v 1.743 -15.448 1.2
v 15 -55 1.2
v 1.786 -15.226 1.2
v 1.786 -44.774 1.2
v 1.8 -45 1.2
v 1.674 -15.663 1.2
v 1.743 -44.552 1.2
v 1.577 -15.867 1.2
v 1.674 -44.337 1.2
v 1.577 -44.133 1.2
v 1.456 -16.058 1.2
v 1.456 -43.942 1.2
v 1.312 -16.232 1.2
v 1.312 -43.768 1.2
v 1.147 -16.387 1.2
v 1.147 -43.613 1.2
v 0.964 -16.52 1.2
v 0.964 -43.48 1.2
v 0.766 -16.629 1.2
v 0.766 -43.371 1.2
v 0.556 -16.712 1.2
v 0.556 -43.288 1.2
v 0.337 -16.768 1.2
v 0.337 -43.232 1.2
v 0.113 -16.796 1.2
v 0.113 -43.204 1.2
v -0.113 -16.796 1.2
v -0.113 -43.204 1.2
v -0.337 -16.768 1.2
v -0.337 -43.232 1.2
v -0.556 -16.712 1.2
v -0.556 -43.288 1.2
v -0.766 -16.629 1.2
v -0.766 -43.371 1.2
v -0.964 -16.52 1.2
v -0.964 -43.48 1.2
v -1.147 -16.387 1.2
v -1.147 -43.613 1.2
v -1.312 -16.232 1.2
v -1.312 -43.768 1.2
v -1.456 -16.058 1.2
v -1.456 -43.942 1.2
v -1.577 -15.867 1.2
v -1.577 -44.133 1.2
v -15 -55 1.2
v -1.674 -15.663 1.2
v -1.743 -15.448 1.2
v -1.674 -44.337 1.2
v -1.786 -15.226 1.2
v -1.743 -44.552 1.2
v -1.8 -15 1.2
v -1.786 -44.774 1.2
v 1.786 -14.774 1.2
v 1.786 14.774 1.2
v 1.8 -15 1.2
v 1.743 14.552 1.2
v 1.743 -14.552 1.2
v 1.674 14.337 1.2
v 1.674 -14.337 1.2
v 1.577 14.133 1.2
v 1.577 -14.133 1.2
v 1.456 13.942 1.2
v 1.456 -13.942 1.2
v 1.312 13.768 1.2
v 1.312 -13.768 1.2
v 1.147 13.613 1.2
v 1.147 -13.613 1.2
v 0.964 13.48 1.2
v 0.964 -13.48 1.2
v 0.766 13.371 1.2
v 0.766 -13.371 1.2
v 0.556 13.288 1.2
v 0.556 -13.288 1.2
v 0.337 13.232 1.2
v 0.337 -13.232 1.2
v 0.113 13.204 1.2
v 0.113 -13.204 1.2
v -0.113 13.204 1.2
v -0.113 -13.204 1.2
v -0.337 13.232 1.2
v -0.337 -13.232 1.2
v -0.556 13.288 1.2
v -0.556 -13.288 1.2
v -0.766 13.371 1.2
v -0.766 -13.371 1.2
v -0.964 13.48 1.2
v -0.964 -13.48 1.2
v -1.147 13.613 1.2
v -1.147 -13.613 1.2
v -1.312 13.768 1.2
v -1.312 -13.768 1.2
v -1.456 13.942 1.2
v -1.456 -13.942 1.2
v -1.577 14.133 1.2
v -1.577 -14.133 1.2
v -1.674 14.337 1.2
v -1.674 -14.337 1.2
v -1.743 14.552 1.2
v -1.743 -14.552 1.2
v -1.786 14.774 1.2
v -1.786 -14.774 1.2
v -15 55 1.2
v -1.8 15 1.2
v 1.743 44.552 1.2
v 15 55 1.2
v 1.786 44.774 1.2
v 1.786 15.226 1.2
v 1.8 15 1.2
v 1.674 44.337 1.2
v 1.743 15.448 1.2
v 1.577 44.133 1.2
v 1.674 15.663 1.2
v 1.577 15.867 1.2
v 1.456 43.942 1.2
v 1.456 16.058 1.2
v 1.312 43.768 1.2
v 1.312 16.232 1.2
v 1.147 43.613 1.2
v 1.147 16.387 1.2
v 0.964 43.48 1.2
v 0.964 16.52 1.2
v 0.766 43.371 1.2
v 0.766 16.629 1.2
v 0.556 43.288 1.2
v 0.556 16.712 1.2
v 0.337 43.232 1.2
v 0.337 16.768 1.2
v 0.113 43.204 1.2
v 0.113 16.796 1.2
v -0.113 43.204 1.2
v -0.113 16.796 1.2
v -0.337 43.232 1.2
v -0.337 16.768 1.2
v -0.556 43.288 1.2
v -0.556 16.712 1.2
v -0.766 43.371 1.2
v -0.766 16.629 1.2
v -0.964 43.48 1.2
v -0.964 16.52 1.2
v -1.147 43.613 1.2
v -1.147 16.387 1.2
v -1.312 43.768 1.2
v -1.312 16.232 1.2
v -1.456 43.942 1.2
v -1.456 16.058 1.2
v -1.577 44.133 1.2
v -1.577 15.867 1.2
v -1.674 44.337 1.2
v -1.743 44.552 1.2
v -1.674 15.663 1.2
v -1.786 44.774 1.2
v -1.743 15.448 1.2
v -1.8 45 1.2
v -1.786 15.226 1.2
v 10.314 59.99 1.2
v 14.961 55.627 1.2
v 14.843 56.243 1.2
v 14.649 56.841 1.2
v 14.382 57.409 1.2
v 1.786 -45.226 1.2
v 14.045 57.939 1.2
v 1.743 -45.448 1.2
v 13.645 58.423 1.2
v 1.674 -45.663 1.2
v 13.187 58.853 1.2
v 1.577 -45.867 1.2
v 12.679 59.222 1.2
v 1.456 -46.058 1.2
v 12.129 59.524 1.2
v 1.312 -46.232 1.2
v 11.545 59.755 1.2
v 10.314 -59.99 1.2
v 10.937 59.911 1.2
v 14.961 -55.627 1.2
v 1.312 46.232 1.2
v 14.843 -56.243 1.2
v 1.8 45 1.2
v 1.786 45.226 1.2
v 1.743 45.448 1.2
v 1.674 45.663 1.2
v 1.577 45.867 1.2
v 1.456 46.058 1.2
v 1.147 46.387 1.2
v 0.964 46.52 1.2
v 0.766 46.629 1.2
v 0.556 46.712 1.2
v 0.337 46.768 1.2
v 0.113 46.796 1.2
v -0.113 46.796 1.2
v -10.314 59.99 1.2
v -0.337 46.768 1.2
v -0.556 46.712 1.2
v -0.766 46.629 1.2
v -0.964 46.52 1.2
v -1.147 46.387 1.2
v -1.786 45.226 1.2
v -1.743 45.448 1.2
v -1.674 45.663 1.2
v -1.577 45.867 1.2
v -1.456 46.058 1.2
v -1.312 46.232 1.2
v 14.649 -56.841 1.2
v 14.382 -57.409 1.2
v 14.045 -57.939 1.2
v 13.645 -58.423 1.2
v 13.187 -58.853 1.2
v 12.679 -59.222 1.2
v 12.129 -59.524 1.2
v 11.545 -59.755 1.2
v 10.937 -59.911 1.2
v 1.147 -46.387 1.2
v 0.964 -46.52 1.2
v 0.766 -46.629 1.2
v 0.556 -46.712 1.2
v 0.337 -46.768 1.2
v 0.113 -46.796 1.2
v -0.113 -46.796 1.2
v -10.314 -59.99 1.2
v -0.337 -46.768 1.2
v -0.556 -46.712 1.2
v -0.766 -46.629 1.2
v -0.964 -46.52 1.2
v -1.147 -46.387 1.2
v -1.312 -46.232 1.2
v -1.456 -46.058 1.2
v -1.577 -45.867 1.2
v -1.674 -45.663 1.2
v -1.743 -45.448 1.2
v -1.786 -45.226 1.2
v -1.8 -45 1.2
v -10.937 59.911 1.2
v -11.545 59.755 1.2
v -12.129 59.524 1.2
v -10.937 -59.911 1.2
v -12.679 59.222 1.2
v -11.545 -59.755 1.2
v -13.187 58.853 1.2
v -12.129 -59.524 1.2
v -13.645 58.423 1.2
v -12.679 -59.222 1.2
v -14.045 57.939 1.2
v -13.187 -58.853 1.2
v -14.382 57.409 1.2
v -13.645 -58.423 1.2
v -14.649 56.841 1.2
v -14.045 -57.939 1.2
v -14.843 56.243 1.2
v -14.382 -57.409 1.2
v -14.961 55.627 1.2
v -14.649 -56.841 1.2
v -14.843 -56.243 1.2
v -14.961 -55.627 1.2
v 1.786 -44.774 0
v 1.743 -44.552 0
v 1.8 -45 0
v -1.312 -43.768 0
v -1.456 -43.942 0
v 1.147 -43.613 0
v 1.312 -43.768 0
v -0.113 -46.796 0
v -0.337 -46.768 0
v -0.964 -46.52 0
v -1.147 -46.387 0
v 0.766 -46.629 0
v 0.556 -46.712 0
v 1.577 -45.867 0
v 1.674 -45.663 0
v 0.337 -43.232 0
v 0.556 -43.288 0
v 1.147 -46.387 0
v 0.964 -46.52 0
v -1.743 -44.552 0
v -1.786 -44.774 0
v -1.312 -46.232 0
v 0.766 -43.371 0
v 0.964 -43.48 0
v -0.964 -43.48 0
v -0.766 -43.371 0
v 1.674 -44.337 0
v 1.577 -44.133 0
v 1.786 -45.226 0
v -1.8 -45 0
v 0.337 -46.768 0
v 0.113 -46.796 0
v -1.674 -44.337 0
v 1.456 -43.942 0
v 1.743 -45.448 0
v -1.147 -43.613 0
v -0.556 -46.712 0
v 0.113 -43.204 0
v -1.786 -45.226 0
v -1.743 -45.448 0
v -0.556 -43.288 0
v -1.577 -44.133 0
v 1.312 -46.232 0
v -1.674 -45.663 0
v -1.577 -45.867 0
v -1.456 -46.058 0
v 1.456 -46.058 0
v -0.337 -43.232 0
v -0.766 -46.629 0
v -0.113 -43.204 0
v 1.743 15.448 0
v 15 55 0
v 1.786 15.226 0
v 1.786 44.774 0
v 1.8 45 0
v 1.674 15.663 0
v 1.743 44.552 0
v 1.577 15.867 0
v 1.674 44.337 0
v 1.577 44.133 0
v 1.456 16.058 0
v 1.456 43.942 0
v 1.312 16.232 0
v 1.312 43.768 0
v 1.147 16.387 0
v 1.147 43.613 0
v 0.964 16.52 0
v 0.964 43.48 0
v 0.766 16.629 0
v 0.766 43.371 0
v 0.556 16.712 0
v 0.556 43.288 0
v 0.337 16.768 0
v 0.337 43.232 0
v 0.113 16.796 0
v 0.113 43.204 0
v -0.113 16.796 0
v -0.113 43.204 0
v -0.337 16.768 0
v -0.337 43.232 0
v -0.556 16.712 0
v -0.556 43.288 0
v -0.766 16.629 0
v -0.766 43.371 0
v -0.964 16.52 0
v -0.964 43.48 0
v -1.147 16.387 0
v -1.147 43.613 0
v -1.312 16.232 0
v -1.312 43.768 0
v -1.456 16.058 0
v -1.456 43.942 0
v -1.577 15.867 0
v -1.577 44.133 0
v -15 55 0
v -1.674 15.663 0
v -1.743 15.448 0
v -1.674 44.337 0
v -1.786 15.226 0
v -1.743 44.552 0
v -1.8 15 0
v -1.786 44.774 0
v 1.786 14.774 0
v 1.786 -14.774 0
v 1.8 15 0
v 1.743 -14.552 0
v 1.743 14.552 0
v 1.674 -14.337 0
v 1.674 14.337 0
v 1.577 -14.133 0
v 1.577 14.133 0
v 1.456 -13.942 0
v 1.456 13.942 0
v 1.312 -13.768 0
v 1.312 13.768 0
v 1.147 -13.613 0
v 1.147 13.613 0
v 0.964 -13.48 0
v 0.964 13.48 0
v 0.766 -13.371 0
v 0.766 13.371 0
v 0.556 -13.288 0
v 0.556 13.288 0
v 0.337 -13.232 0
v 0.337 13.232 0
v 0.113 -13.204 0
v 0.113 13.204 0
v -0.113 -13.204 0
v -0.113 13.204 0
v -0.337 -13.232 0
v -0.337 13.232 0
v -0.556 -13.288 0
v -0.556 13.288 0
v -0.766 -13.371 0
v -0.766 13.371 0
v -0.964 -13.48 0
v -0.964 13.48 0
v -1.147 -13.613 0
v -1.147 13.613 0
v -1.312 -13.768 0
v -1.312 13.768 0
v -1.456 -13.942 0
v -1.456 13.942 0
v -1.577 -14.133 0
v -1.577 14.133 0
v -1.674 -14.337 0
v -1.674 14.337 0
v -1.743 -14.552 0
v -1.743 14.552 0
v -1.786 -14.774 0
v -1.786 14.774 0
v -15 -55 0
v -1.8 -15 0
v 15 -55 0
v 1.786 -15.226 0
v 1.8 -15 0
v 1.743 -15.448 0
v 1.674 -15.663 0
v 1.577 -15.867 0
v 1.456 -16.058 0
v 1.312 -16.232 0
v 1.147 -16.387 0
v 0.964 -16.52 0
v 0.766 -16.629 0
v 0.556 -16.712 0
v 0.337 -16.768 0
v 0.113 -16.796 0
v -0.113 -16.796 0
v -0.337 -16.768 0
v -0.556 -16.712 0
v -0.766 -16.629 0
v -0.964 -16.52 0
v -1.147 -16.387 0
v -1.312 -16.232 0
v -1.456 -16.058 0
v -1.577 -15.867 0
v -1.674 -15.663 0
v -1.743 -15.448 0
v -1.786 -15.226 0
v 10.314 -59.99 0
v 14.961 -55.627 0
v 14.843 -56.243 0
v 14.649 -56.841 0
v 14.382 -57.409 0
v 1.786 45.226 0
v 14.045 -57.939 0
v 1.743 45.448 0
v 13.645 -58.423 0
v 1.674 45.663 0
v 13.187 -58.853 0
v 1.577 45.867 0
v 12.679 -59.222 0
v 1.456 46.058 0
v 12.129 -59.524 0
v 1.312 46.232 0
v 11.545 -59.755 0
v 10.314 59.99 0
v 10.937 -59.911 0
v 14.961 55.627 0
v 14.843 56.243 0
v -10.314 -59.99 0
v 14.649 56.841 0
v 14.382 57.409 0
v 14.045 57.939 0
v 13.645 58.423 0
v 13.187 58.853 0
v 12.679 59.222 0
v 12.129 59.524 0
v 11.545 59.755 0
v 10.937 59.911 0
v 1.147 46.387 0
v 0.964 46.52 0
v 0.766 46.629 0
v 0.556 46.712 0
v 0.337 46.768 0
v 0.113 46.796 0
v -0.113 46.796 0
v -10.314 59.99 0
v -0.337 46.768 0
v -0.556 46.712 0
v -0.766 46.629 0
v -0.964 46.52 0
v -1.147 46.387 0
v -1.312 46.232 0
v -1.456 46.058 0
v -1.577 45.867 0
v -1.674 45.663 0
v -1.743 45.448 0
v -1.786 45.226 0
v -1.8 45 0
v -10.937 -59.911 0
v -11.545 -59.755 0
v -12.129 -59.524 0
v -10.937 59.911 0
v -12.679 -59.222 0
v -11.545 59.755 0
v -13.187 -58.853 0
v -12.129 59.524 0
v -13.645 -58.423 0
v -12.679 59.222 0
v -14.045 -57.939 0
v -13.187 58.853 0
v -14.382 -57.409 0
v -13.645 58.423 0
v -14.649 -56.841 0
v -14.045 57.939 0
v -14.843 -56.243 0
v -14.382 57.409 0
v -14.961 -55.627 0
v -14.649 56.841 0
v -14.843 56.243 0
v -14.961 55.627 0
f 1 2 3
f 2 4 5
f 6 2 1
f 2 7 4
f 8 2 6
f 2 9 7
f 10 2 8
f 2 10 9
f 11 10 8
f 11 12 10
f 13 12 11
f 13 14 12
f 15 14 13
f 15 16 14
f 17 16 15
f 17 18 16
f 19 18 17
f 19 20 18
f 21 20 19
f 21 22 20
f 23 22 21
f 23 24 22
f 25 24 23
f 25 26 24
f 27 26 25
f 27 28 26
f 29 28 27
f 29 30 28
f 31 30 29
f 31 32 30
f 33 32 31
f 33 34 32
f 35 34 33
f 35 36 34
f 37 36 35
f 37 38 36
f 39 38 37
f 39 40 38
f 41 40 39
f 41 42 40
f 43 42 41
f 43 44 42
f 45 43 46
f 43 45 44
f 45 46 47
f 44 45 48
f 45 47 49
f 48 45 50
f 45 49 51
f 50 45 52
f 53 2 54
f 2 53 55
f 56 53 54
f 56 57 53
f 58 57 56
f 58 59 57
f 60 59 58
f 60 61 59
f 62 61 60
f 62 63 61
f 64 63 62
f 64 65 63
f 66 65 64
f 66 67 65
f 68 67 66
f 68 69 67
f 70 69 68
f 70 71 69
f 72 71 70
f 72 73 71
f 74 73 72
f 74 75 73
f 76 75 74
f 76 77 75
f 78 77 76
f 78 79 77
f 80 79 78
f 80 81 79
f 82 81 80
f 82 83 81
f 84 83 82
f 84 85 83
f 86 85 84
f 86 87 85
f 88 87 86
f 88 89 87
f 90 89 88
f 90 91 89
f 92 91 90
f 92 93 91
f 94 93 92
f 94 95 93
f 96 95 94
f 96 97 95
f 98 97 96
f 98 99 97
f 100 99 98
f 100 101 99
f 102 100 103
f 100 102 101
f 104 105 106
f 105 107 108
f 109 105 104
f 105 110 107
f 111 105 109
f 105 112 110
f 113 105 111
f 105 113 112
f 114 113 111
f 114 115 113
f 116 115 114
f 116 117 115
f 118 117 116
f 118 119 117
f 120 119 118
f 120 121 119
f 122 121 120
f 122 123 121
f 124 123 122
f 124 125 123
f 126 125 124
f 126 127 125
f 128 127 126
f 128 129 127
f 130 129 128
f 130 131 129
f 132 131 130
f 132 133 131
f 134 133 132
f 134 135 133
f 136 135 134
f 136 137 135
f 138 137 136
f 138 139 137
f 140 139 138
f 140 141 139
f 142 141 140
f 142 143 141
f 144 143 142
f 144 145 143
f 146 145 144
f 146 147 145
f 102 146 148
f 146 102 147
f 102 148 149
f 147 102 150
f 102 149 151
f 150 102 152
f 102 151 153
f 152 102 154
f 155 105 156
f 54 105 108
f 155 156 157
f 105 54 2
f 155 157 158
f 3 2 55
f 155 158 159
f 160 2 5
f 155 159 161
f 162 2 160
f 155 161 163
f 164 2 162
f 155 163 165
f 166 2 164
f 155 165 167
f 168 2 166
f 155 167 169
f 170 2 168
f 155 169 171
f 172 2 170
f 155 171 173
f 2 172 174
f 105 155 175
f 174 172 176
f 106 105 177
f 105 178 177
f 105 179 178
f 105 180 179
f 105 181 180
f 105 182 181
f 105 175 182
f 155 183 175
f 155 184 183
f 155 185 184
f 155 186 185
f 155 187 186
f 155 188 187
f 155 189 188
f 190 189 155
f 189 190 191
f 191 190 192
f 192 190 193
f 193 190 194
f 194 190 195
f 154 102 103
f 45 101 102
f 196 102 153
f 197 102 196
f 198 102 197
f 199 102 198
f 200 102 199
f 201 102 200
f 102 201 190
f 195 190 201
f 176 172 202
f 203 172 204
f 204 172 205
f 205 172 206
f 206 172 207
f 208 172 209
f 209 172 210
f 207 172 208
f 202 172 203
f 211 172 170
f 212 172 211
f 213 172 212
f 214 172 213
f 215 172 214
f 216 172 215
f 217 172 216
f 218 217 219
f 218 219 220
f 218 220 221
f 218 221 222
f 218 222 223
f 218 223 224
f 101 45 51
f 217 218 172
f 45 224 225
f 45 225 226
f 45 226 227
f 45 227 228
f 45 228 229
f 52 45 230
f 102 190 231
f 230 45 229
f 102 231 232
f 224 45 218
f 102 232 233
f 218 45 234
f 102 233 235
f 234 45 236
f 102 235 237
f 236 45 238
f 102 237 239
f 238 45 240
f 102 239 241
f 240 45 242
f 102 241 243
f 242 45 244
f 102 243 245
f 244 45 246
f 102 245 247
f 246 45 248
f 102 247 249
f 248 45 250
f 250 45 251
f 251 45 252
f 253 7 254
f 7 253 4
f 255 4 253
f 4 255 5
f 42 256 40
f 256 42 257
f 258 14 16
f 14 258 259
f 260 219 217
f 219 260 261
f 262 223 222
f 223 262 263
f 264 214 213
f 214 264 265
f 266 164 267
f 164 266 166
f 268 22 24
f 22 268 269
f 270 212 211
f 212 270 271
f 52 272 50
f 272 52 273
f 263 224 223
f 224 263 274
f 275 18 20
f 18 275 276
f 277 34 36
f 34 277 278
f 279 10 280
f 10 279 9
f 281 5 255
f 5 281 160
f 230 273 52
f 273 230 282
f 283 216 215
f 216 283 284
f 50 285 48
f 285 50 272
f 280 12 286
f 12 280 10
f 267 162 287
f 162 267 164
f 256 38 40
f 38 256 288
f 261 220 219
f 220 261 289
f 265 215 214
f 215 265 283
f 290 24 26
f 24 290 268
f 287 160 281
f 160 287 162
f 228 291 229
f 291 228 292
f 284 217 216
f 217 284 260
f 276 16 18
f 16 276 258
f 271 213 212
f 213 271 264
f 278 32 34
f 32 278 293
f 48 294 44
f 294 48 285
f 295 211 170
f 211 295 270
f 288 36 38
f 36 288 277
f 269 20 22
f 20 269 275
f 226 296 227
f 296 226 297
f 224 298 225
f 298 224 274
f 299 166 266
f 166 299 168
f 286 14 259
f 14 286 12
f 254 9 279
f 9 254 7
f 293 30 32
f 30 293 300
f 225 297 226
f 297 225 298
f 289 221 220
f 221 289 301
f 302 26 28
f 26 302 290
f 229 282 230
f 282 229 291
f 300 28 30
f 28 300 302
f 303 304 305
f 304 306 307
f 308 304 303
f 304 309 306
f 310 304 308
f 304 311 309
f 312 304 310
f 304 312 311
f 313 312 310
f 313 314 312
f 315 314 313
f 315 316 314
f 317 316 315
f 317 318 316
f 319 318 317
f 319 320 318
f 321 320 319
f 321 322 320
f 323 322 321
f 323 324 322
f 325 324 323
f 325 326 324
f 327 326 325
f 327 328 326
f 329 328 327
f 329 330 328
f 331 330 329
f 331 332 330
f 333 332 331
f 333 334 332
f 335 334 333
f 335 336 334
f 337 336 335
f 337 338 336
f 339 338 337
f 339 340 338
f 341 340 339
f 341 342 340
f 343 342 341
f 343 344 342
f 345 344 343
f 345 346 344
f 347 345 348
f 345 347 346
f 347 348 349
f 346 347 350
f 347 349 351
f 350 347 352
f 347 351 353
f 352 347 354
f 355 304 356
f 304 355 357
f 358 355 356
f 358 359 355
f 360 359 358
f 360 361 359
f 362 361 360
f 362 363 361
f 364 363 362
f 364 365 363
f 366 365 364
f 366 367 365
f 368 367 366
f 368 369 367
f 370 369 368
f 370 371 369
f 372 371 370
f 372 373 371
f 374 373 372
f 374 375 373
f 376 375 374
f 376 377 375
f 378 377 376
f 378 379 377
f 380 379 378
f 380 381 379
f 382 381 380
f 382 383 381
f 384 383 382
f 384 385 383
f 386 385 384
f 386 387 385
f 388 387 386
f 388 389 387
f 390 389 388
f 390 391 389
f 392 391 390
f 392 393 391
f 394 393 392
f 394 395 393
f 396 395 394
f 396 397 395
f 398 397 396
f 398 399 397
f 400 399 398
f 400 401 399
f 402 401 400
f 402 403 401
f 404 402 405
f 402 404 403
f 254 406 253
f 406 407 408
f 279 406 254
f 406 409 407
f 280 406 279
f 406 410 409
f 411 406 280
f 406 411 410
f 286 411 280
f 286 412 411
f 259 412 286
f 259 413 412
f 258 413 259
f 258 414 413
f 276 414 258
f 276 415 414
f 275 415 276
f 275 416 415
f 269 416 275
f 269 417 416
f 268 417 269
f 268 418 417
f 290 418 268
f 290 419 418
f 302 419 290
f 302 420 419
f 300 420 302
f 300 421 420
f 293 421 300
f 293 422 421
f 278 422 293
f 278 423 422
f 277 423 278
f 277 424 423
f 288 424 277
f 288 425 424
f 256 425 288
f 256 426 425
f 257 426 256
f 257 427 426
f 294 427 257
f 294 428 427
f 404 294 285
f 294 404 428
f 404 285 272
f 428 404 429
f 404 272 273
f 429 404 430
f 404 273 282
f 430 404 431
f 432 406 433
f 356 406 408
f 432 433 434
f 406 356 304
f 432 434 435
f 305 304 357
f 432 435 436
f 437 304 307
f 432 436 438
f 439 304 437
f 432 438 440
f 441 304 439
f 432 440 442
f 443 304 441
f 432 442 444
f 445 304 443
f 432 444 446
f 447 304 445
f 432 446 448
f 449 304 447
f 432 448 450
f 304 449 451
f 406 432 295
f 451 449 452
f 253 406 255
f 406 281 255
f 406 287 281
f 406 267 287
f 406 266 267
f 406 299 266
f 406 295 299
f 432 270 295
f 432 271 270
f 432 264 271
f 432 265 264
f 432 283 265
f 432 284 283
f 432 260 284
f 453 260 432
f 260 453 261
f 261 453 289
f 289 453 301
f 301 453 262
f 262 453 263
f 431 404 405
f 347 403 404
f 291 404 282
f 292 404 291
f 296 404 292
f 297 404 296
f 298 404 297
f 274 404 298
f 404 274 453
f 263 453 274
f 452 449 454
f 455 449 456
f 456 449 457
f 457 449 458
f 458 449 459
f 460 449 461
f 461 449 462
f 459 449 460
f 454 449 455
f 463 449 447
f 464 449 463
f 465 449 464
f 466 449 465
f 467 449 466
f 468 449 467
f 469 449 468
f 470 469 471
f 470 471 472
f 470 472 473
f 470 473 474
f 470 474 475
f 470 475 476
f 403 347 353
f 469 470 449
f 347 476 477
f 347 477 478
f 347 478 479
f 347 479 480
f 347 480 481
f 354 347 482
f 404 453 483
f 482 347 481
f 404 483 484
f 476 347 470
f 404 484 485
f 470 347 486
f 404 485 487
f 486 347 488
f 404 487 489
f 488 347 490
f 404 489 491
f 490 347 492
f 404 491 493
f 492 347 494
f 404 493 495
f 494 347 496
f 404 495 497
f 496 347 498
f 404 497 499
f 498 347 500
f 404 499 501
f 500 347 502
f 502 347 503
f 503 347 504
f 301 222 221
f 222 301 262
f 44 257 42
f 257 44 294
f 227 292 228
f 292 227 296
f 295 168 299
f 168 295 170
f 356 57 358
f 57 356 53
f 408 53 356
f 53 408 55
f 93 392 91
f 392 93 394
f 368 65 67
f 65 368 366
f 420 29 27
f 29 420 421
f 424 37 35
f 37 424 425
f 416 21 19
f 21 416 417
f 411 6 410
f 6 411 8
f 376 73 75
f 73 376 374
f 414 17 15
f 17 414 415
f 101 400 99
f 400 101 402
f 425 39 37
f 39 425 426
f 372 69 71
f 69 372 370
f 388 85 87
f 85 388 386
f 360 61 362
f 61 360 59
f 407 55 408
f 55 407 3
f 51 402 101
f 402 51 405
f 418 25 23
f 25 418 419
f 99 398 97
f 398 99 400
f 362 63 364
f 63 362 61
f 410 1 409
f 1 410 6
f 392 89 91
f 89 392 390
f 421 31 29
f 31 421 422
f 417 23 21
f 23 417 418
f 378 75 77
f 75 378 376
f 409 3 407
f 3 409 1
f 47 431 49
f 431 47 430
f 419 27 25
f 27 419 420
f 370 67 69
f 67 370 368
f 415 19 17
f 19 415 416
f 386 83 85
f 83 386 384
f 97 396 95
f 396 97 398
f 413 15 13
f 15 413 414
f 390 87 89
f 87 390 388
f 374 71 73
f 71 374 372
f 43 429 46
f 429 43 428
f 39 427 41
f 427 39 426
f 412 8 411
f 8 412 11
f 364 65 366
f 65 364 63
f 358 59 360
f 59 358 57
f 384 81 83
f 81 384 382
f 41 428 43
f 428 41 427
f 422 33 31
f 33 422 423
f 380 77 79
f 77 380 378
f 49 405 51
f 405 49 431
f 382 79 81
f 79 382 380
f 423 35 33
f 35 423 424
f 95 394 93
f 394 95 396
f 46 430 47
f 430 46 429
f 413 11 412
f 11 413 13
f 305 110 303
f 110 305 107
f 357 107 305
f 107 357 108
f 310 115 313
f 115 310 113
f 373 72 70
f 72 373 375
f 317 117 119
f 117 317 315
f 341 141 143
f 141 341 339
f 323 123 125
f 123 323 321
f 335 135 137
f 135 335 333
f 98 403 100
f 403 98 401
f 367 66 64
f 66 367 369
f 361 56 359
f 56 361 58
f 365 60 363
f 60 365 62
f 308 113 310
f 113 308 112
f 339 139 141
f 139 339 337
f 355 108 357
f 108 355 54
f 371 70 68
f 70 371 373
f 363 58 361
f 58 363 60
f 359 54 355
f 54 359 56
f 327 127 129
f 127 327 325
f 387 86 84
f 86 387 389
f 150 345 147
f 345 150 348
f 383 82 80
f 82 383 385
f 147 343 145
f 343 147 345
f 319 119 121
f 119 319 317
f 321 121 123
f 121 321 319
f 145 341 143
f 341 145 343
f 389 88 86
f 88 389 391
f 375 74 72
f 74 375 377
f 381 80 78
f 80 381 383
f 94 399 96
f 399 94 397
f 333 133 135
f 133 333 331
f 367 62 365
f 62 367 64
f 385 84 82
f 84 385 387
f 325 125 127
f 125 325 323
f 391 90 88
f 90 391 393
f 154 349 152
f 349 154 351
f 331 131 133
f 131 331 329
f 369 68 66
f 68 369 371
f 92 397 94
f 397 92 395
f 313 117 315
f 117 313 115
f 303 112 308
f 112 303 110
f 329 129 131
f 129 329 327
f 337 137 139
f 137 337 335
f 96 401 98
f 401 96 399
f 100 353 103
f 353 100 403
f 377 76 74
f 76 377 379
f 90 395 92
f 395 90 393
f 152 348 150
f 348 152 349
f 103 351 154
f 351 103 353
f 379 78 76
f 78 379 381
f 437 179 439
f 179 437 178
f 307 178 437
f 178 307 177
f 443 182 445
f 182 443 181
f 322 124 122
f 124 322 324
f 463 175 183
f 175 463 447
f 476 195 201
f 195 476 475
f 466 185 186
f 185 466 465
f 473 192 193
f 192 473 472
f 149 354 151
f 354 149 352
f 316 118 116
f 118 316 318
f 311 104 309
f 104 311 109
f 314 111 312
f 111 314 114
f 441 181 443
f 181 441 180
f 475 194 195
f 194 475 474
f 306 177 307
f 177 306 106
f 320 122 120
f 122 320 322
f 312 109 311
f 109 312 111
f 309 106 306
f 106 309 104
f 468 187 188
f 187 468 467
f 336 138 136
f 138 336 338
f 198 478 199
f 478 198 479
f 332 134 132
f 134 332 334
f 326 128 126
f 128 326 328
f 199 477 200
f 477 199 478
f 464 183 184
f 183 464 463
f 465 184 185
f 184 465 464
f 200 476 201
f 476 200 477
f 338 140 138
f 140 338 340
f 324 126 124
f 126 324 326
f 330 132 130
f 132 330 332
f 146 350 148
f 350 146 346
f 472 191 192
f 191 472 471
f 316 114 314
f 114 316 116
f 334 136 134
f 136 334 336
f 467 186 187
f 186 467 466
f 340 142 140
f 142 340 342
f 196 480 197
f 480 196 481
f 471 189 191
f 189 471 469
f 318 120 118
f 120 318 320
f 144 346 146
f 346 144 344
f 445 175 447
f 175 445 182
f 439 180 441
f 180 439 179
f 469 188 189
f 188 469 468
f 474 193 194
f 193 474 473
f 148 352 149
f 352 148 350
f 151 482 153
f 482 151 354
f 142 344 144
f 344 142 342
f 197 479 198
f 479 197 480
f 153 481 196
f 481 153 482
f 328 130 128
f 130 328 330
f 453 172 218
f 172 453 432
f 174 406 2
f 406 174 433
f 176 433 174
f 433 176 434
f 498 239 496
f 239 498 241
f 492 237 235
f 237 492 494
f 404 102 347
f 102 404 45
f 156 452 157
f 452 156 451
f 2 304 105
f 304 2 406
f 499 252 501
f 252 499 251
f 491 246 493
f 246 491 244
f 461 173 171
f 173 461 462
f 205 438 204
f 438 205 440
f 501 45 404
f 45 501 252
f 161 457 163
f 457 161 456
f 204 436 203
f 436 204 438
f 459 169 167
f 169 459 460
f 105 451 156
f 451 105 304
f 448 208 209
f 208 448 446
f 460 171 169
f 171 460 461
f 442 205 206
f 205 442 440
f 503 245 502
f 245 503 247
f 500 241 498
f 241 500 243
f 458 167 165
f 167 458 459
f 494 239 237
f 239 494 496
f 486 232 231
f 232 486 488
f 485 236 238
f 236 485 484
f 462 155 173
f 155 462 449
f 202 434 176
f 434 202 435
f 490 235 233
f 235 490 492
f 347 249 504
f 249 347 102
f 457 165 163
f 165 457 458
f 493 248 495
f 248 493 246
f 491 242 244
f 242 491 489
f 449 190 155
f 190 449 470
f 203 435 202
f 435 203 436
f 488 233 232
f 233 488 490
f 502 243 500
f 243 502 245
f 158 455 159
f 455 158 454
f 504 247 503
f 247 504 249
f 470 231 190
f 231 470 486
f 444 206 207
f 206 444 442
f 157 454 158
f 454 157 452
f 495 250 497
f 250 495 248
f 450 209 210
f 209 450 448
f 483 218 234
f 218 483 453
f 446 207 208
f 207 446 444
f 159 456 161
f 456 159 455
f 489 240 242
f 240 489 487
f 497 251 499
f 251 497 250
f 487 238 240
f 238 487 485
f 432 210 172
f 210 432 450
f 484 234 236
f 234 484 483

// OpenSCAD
$fn = 50;


difference() {
	union() {
		hull() {
			translate(v = [-10.0000000000, 55.0000000000, 0]) {
				cylinder(h = 90, r = 5);
			}
			translate(v = [10.0000000000, 55.0000000000, 0]) {
				cylinder(h = 90, r = 5);
			}
			translate(v = [-10.0000000000, -55.0000000000, 0]) {
				cylinder(h = 90, r = 5);
			}
			translate(v = [10.0000000000, -55.0000000000, 0]) {
				cylinder(h = 90, r = 5);
			}
		}
	}
	union() {
		translate(v = [0, 0, 1.2000000000]) {
			hull() {
				translate(v = [-10.0000000000, 55.0000000000, 0]) {
					cylinder(h = 88.8000000000, r = 3.8000000000);
				}
				translate(v = [10.0000000000, 55.0000000000, 0]) {
					cylinder(h = 88.8000000000, r = 3.8000000000);
				}
				translate(v = [-10.0000000000, -55.0000000000, 0]) {
					cylinder(h = 88.8000000000, r = 3.8000000000);
				}
				translate(v = [10.0000000000, -55.0000000000, 0]) {
					cylinder(h = 88.8000000000, r = 3.8000000000);
				}
			}
		}
		#translate(v = [0.0000000000, -45.0000000000, 0]) {
			cylinder(h = 1.2000000000, r = 1.8000000000);
		}
		#translate(v = [0.0000000000, -15.0000000000, 0]) {
			cylinder(h = 1.2000000000, r = 1.8000000000);
		}
		#translate(v = [0.0000000000, 15.0000000000, 0]) {
			cylinder(h = 1.2000000000, r = 1.8000000000);
		}
		#translate(v = [0.0000000000, 45.0000000000, 0]) {
			cylinder(h = 1.2000000000, r = 1.8000000000);
		}
		translate(v = [-250.0000000000, -250.0000000000, 1.2000000000]) {
			cube(size = [500, 500, 500]);
		}
		translate(v = [-250.0000000000, -250.0000000000, 1.2000000000]) {
			cube(size = [500, 500, 500]);
		}
		translate(v = [-250.0000000000, -250.0000000000, 1.2000000000]) {
			cube(size = [500, 500, 500]);
		}
	}
}
